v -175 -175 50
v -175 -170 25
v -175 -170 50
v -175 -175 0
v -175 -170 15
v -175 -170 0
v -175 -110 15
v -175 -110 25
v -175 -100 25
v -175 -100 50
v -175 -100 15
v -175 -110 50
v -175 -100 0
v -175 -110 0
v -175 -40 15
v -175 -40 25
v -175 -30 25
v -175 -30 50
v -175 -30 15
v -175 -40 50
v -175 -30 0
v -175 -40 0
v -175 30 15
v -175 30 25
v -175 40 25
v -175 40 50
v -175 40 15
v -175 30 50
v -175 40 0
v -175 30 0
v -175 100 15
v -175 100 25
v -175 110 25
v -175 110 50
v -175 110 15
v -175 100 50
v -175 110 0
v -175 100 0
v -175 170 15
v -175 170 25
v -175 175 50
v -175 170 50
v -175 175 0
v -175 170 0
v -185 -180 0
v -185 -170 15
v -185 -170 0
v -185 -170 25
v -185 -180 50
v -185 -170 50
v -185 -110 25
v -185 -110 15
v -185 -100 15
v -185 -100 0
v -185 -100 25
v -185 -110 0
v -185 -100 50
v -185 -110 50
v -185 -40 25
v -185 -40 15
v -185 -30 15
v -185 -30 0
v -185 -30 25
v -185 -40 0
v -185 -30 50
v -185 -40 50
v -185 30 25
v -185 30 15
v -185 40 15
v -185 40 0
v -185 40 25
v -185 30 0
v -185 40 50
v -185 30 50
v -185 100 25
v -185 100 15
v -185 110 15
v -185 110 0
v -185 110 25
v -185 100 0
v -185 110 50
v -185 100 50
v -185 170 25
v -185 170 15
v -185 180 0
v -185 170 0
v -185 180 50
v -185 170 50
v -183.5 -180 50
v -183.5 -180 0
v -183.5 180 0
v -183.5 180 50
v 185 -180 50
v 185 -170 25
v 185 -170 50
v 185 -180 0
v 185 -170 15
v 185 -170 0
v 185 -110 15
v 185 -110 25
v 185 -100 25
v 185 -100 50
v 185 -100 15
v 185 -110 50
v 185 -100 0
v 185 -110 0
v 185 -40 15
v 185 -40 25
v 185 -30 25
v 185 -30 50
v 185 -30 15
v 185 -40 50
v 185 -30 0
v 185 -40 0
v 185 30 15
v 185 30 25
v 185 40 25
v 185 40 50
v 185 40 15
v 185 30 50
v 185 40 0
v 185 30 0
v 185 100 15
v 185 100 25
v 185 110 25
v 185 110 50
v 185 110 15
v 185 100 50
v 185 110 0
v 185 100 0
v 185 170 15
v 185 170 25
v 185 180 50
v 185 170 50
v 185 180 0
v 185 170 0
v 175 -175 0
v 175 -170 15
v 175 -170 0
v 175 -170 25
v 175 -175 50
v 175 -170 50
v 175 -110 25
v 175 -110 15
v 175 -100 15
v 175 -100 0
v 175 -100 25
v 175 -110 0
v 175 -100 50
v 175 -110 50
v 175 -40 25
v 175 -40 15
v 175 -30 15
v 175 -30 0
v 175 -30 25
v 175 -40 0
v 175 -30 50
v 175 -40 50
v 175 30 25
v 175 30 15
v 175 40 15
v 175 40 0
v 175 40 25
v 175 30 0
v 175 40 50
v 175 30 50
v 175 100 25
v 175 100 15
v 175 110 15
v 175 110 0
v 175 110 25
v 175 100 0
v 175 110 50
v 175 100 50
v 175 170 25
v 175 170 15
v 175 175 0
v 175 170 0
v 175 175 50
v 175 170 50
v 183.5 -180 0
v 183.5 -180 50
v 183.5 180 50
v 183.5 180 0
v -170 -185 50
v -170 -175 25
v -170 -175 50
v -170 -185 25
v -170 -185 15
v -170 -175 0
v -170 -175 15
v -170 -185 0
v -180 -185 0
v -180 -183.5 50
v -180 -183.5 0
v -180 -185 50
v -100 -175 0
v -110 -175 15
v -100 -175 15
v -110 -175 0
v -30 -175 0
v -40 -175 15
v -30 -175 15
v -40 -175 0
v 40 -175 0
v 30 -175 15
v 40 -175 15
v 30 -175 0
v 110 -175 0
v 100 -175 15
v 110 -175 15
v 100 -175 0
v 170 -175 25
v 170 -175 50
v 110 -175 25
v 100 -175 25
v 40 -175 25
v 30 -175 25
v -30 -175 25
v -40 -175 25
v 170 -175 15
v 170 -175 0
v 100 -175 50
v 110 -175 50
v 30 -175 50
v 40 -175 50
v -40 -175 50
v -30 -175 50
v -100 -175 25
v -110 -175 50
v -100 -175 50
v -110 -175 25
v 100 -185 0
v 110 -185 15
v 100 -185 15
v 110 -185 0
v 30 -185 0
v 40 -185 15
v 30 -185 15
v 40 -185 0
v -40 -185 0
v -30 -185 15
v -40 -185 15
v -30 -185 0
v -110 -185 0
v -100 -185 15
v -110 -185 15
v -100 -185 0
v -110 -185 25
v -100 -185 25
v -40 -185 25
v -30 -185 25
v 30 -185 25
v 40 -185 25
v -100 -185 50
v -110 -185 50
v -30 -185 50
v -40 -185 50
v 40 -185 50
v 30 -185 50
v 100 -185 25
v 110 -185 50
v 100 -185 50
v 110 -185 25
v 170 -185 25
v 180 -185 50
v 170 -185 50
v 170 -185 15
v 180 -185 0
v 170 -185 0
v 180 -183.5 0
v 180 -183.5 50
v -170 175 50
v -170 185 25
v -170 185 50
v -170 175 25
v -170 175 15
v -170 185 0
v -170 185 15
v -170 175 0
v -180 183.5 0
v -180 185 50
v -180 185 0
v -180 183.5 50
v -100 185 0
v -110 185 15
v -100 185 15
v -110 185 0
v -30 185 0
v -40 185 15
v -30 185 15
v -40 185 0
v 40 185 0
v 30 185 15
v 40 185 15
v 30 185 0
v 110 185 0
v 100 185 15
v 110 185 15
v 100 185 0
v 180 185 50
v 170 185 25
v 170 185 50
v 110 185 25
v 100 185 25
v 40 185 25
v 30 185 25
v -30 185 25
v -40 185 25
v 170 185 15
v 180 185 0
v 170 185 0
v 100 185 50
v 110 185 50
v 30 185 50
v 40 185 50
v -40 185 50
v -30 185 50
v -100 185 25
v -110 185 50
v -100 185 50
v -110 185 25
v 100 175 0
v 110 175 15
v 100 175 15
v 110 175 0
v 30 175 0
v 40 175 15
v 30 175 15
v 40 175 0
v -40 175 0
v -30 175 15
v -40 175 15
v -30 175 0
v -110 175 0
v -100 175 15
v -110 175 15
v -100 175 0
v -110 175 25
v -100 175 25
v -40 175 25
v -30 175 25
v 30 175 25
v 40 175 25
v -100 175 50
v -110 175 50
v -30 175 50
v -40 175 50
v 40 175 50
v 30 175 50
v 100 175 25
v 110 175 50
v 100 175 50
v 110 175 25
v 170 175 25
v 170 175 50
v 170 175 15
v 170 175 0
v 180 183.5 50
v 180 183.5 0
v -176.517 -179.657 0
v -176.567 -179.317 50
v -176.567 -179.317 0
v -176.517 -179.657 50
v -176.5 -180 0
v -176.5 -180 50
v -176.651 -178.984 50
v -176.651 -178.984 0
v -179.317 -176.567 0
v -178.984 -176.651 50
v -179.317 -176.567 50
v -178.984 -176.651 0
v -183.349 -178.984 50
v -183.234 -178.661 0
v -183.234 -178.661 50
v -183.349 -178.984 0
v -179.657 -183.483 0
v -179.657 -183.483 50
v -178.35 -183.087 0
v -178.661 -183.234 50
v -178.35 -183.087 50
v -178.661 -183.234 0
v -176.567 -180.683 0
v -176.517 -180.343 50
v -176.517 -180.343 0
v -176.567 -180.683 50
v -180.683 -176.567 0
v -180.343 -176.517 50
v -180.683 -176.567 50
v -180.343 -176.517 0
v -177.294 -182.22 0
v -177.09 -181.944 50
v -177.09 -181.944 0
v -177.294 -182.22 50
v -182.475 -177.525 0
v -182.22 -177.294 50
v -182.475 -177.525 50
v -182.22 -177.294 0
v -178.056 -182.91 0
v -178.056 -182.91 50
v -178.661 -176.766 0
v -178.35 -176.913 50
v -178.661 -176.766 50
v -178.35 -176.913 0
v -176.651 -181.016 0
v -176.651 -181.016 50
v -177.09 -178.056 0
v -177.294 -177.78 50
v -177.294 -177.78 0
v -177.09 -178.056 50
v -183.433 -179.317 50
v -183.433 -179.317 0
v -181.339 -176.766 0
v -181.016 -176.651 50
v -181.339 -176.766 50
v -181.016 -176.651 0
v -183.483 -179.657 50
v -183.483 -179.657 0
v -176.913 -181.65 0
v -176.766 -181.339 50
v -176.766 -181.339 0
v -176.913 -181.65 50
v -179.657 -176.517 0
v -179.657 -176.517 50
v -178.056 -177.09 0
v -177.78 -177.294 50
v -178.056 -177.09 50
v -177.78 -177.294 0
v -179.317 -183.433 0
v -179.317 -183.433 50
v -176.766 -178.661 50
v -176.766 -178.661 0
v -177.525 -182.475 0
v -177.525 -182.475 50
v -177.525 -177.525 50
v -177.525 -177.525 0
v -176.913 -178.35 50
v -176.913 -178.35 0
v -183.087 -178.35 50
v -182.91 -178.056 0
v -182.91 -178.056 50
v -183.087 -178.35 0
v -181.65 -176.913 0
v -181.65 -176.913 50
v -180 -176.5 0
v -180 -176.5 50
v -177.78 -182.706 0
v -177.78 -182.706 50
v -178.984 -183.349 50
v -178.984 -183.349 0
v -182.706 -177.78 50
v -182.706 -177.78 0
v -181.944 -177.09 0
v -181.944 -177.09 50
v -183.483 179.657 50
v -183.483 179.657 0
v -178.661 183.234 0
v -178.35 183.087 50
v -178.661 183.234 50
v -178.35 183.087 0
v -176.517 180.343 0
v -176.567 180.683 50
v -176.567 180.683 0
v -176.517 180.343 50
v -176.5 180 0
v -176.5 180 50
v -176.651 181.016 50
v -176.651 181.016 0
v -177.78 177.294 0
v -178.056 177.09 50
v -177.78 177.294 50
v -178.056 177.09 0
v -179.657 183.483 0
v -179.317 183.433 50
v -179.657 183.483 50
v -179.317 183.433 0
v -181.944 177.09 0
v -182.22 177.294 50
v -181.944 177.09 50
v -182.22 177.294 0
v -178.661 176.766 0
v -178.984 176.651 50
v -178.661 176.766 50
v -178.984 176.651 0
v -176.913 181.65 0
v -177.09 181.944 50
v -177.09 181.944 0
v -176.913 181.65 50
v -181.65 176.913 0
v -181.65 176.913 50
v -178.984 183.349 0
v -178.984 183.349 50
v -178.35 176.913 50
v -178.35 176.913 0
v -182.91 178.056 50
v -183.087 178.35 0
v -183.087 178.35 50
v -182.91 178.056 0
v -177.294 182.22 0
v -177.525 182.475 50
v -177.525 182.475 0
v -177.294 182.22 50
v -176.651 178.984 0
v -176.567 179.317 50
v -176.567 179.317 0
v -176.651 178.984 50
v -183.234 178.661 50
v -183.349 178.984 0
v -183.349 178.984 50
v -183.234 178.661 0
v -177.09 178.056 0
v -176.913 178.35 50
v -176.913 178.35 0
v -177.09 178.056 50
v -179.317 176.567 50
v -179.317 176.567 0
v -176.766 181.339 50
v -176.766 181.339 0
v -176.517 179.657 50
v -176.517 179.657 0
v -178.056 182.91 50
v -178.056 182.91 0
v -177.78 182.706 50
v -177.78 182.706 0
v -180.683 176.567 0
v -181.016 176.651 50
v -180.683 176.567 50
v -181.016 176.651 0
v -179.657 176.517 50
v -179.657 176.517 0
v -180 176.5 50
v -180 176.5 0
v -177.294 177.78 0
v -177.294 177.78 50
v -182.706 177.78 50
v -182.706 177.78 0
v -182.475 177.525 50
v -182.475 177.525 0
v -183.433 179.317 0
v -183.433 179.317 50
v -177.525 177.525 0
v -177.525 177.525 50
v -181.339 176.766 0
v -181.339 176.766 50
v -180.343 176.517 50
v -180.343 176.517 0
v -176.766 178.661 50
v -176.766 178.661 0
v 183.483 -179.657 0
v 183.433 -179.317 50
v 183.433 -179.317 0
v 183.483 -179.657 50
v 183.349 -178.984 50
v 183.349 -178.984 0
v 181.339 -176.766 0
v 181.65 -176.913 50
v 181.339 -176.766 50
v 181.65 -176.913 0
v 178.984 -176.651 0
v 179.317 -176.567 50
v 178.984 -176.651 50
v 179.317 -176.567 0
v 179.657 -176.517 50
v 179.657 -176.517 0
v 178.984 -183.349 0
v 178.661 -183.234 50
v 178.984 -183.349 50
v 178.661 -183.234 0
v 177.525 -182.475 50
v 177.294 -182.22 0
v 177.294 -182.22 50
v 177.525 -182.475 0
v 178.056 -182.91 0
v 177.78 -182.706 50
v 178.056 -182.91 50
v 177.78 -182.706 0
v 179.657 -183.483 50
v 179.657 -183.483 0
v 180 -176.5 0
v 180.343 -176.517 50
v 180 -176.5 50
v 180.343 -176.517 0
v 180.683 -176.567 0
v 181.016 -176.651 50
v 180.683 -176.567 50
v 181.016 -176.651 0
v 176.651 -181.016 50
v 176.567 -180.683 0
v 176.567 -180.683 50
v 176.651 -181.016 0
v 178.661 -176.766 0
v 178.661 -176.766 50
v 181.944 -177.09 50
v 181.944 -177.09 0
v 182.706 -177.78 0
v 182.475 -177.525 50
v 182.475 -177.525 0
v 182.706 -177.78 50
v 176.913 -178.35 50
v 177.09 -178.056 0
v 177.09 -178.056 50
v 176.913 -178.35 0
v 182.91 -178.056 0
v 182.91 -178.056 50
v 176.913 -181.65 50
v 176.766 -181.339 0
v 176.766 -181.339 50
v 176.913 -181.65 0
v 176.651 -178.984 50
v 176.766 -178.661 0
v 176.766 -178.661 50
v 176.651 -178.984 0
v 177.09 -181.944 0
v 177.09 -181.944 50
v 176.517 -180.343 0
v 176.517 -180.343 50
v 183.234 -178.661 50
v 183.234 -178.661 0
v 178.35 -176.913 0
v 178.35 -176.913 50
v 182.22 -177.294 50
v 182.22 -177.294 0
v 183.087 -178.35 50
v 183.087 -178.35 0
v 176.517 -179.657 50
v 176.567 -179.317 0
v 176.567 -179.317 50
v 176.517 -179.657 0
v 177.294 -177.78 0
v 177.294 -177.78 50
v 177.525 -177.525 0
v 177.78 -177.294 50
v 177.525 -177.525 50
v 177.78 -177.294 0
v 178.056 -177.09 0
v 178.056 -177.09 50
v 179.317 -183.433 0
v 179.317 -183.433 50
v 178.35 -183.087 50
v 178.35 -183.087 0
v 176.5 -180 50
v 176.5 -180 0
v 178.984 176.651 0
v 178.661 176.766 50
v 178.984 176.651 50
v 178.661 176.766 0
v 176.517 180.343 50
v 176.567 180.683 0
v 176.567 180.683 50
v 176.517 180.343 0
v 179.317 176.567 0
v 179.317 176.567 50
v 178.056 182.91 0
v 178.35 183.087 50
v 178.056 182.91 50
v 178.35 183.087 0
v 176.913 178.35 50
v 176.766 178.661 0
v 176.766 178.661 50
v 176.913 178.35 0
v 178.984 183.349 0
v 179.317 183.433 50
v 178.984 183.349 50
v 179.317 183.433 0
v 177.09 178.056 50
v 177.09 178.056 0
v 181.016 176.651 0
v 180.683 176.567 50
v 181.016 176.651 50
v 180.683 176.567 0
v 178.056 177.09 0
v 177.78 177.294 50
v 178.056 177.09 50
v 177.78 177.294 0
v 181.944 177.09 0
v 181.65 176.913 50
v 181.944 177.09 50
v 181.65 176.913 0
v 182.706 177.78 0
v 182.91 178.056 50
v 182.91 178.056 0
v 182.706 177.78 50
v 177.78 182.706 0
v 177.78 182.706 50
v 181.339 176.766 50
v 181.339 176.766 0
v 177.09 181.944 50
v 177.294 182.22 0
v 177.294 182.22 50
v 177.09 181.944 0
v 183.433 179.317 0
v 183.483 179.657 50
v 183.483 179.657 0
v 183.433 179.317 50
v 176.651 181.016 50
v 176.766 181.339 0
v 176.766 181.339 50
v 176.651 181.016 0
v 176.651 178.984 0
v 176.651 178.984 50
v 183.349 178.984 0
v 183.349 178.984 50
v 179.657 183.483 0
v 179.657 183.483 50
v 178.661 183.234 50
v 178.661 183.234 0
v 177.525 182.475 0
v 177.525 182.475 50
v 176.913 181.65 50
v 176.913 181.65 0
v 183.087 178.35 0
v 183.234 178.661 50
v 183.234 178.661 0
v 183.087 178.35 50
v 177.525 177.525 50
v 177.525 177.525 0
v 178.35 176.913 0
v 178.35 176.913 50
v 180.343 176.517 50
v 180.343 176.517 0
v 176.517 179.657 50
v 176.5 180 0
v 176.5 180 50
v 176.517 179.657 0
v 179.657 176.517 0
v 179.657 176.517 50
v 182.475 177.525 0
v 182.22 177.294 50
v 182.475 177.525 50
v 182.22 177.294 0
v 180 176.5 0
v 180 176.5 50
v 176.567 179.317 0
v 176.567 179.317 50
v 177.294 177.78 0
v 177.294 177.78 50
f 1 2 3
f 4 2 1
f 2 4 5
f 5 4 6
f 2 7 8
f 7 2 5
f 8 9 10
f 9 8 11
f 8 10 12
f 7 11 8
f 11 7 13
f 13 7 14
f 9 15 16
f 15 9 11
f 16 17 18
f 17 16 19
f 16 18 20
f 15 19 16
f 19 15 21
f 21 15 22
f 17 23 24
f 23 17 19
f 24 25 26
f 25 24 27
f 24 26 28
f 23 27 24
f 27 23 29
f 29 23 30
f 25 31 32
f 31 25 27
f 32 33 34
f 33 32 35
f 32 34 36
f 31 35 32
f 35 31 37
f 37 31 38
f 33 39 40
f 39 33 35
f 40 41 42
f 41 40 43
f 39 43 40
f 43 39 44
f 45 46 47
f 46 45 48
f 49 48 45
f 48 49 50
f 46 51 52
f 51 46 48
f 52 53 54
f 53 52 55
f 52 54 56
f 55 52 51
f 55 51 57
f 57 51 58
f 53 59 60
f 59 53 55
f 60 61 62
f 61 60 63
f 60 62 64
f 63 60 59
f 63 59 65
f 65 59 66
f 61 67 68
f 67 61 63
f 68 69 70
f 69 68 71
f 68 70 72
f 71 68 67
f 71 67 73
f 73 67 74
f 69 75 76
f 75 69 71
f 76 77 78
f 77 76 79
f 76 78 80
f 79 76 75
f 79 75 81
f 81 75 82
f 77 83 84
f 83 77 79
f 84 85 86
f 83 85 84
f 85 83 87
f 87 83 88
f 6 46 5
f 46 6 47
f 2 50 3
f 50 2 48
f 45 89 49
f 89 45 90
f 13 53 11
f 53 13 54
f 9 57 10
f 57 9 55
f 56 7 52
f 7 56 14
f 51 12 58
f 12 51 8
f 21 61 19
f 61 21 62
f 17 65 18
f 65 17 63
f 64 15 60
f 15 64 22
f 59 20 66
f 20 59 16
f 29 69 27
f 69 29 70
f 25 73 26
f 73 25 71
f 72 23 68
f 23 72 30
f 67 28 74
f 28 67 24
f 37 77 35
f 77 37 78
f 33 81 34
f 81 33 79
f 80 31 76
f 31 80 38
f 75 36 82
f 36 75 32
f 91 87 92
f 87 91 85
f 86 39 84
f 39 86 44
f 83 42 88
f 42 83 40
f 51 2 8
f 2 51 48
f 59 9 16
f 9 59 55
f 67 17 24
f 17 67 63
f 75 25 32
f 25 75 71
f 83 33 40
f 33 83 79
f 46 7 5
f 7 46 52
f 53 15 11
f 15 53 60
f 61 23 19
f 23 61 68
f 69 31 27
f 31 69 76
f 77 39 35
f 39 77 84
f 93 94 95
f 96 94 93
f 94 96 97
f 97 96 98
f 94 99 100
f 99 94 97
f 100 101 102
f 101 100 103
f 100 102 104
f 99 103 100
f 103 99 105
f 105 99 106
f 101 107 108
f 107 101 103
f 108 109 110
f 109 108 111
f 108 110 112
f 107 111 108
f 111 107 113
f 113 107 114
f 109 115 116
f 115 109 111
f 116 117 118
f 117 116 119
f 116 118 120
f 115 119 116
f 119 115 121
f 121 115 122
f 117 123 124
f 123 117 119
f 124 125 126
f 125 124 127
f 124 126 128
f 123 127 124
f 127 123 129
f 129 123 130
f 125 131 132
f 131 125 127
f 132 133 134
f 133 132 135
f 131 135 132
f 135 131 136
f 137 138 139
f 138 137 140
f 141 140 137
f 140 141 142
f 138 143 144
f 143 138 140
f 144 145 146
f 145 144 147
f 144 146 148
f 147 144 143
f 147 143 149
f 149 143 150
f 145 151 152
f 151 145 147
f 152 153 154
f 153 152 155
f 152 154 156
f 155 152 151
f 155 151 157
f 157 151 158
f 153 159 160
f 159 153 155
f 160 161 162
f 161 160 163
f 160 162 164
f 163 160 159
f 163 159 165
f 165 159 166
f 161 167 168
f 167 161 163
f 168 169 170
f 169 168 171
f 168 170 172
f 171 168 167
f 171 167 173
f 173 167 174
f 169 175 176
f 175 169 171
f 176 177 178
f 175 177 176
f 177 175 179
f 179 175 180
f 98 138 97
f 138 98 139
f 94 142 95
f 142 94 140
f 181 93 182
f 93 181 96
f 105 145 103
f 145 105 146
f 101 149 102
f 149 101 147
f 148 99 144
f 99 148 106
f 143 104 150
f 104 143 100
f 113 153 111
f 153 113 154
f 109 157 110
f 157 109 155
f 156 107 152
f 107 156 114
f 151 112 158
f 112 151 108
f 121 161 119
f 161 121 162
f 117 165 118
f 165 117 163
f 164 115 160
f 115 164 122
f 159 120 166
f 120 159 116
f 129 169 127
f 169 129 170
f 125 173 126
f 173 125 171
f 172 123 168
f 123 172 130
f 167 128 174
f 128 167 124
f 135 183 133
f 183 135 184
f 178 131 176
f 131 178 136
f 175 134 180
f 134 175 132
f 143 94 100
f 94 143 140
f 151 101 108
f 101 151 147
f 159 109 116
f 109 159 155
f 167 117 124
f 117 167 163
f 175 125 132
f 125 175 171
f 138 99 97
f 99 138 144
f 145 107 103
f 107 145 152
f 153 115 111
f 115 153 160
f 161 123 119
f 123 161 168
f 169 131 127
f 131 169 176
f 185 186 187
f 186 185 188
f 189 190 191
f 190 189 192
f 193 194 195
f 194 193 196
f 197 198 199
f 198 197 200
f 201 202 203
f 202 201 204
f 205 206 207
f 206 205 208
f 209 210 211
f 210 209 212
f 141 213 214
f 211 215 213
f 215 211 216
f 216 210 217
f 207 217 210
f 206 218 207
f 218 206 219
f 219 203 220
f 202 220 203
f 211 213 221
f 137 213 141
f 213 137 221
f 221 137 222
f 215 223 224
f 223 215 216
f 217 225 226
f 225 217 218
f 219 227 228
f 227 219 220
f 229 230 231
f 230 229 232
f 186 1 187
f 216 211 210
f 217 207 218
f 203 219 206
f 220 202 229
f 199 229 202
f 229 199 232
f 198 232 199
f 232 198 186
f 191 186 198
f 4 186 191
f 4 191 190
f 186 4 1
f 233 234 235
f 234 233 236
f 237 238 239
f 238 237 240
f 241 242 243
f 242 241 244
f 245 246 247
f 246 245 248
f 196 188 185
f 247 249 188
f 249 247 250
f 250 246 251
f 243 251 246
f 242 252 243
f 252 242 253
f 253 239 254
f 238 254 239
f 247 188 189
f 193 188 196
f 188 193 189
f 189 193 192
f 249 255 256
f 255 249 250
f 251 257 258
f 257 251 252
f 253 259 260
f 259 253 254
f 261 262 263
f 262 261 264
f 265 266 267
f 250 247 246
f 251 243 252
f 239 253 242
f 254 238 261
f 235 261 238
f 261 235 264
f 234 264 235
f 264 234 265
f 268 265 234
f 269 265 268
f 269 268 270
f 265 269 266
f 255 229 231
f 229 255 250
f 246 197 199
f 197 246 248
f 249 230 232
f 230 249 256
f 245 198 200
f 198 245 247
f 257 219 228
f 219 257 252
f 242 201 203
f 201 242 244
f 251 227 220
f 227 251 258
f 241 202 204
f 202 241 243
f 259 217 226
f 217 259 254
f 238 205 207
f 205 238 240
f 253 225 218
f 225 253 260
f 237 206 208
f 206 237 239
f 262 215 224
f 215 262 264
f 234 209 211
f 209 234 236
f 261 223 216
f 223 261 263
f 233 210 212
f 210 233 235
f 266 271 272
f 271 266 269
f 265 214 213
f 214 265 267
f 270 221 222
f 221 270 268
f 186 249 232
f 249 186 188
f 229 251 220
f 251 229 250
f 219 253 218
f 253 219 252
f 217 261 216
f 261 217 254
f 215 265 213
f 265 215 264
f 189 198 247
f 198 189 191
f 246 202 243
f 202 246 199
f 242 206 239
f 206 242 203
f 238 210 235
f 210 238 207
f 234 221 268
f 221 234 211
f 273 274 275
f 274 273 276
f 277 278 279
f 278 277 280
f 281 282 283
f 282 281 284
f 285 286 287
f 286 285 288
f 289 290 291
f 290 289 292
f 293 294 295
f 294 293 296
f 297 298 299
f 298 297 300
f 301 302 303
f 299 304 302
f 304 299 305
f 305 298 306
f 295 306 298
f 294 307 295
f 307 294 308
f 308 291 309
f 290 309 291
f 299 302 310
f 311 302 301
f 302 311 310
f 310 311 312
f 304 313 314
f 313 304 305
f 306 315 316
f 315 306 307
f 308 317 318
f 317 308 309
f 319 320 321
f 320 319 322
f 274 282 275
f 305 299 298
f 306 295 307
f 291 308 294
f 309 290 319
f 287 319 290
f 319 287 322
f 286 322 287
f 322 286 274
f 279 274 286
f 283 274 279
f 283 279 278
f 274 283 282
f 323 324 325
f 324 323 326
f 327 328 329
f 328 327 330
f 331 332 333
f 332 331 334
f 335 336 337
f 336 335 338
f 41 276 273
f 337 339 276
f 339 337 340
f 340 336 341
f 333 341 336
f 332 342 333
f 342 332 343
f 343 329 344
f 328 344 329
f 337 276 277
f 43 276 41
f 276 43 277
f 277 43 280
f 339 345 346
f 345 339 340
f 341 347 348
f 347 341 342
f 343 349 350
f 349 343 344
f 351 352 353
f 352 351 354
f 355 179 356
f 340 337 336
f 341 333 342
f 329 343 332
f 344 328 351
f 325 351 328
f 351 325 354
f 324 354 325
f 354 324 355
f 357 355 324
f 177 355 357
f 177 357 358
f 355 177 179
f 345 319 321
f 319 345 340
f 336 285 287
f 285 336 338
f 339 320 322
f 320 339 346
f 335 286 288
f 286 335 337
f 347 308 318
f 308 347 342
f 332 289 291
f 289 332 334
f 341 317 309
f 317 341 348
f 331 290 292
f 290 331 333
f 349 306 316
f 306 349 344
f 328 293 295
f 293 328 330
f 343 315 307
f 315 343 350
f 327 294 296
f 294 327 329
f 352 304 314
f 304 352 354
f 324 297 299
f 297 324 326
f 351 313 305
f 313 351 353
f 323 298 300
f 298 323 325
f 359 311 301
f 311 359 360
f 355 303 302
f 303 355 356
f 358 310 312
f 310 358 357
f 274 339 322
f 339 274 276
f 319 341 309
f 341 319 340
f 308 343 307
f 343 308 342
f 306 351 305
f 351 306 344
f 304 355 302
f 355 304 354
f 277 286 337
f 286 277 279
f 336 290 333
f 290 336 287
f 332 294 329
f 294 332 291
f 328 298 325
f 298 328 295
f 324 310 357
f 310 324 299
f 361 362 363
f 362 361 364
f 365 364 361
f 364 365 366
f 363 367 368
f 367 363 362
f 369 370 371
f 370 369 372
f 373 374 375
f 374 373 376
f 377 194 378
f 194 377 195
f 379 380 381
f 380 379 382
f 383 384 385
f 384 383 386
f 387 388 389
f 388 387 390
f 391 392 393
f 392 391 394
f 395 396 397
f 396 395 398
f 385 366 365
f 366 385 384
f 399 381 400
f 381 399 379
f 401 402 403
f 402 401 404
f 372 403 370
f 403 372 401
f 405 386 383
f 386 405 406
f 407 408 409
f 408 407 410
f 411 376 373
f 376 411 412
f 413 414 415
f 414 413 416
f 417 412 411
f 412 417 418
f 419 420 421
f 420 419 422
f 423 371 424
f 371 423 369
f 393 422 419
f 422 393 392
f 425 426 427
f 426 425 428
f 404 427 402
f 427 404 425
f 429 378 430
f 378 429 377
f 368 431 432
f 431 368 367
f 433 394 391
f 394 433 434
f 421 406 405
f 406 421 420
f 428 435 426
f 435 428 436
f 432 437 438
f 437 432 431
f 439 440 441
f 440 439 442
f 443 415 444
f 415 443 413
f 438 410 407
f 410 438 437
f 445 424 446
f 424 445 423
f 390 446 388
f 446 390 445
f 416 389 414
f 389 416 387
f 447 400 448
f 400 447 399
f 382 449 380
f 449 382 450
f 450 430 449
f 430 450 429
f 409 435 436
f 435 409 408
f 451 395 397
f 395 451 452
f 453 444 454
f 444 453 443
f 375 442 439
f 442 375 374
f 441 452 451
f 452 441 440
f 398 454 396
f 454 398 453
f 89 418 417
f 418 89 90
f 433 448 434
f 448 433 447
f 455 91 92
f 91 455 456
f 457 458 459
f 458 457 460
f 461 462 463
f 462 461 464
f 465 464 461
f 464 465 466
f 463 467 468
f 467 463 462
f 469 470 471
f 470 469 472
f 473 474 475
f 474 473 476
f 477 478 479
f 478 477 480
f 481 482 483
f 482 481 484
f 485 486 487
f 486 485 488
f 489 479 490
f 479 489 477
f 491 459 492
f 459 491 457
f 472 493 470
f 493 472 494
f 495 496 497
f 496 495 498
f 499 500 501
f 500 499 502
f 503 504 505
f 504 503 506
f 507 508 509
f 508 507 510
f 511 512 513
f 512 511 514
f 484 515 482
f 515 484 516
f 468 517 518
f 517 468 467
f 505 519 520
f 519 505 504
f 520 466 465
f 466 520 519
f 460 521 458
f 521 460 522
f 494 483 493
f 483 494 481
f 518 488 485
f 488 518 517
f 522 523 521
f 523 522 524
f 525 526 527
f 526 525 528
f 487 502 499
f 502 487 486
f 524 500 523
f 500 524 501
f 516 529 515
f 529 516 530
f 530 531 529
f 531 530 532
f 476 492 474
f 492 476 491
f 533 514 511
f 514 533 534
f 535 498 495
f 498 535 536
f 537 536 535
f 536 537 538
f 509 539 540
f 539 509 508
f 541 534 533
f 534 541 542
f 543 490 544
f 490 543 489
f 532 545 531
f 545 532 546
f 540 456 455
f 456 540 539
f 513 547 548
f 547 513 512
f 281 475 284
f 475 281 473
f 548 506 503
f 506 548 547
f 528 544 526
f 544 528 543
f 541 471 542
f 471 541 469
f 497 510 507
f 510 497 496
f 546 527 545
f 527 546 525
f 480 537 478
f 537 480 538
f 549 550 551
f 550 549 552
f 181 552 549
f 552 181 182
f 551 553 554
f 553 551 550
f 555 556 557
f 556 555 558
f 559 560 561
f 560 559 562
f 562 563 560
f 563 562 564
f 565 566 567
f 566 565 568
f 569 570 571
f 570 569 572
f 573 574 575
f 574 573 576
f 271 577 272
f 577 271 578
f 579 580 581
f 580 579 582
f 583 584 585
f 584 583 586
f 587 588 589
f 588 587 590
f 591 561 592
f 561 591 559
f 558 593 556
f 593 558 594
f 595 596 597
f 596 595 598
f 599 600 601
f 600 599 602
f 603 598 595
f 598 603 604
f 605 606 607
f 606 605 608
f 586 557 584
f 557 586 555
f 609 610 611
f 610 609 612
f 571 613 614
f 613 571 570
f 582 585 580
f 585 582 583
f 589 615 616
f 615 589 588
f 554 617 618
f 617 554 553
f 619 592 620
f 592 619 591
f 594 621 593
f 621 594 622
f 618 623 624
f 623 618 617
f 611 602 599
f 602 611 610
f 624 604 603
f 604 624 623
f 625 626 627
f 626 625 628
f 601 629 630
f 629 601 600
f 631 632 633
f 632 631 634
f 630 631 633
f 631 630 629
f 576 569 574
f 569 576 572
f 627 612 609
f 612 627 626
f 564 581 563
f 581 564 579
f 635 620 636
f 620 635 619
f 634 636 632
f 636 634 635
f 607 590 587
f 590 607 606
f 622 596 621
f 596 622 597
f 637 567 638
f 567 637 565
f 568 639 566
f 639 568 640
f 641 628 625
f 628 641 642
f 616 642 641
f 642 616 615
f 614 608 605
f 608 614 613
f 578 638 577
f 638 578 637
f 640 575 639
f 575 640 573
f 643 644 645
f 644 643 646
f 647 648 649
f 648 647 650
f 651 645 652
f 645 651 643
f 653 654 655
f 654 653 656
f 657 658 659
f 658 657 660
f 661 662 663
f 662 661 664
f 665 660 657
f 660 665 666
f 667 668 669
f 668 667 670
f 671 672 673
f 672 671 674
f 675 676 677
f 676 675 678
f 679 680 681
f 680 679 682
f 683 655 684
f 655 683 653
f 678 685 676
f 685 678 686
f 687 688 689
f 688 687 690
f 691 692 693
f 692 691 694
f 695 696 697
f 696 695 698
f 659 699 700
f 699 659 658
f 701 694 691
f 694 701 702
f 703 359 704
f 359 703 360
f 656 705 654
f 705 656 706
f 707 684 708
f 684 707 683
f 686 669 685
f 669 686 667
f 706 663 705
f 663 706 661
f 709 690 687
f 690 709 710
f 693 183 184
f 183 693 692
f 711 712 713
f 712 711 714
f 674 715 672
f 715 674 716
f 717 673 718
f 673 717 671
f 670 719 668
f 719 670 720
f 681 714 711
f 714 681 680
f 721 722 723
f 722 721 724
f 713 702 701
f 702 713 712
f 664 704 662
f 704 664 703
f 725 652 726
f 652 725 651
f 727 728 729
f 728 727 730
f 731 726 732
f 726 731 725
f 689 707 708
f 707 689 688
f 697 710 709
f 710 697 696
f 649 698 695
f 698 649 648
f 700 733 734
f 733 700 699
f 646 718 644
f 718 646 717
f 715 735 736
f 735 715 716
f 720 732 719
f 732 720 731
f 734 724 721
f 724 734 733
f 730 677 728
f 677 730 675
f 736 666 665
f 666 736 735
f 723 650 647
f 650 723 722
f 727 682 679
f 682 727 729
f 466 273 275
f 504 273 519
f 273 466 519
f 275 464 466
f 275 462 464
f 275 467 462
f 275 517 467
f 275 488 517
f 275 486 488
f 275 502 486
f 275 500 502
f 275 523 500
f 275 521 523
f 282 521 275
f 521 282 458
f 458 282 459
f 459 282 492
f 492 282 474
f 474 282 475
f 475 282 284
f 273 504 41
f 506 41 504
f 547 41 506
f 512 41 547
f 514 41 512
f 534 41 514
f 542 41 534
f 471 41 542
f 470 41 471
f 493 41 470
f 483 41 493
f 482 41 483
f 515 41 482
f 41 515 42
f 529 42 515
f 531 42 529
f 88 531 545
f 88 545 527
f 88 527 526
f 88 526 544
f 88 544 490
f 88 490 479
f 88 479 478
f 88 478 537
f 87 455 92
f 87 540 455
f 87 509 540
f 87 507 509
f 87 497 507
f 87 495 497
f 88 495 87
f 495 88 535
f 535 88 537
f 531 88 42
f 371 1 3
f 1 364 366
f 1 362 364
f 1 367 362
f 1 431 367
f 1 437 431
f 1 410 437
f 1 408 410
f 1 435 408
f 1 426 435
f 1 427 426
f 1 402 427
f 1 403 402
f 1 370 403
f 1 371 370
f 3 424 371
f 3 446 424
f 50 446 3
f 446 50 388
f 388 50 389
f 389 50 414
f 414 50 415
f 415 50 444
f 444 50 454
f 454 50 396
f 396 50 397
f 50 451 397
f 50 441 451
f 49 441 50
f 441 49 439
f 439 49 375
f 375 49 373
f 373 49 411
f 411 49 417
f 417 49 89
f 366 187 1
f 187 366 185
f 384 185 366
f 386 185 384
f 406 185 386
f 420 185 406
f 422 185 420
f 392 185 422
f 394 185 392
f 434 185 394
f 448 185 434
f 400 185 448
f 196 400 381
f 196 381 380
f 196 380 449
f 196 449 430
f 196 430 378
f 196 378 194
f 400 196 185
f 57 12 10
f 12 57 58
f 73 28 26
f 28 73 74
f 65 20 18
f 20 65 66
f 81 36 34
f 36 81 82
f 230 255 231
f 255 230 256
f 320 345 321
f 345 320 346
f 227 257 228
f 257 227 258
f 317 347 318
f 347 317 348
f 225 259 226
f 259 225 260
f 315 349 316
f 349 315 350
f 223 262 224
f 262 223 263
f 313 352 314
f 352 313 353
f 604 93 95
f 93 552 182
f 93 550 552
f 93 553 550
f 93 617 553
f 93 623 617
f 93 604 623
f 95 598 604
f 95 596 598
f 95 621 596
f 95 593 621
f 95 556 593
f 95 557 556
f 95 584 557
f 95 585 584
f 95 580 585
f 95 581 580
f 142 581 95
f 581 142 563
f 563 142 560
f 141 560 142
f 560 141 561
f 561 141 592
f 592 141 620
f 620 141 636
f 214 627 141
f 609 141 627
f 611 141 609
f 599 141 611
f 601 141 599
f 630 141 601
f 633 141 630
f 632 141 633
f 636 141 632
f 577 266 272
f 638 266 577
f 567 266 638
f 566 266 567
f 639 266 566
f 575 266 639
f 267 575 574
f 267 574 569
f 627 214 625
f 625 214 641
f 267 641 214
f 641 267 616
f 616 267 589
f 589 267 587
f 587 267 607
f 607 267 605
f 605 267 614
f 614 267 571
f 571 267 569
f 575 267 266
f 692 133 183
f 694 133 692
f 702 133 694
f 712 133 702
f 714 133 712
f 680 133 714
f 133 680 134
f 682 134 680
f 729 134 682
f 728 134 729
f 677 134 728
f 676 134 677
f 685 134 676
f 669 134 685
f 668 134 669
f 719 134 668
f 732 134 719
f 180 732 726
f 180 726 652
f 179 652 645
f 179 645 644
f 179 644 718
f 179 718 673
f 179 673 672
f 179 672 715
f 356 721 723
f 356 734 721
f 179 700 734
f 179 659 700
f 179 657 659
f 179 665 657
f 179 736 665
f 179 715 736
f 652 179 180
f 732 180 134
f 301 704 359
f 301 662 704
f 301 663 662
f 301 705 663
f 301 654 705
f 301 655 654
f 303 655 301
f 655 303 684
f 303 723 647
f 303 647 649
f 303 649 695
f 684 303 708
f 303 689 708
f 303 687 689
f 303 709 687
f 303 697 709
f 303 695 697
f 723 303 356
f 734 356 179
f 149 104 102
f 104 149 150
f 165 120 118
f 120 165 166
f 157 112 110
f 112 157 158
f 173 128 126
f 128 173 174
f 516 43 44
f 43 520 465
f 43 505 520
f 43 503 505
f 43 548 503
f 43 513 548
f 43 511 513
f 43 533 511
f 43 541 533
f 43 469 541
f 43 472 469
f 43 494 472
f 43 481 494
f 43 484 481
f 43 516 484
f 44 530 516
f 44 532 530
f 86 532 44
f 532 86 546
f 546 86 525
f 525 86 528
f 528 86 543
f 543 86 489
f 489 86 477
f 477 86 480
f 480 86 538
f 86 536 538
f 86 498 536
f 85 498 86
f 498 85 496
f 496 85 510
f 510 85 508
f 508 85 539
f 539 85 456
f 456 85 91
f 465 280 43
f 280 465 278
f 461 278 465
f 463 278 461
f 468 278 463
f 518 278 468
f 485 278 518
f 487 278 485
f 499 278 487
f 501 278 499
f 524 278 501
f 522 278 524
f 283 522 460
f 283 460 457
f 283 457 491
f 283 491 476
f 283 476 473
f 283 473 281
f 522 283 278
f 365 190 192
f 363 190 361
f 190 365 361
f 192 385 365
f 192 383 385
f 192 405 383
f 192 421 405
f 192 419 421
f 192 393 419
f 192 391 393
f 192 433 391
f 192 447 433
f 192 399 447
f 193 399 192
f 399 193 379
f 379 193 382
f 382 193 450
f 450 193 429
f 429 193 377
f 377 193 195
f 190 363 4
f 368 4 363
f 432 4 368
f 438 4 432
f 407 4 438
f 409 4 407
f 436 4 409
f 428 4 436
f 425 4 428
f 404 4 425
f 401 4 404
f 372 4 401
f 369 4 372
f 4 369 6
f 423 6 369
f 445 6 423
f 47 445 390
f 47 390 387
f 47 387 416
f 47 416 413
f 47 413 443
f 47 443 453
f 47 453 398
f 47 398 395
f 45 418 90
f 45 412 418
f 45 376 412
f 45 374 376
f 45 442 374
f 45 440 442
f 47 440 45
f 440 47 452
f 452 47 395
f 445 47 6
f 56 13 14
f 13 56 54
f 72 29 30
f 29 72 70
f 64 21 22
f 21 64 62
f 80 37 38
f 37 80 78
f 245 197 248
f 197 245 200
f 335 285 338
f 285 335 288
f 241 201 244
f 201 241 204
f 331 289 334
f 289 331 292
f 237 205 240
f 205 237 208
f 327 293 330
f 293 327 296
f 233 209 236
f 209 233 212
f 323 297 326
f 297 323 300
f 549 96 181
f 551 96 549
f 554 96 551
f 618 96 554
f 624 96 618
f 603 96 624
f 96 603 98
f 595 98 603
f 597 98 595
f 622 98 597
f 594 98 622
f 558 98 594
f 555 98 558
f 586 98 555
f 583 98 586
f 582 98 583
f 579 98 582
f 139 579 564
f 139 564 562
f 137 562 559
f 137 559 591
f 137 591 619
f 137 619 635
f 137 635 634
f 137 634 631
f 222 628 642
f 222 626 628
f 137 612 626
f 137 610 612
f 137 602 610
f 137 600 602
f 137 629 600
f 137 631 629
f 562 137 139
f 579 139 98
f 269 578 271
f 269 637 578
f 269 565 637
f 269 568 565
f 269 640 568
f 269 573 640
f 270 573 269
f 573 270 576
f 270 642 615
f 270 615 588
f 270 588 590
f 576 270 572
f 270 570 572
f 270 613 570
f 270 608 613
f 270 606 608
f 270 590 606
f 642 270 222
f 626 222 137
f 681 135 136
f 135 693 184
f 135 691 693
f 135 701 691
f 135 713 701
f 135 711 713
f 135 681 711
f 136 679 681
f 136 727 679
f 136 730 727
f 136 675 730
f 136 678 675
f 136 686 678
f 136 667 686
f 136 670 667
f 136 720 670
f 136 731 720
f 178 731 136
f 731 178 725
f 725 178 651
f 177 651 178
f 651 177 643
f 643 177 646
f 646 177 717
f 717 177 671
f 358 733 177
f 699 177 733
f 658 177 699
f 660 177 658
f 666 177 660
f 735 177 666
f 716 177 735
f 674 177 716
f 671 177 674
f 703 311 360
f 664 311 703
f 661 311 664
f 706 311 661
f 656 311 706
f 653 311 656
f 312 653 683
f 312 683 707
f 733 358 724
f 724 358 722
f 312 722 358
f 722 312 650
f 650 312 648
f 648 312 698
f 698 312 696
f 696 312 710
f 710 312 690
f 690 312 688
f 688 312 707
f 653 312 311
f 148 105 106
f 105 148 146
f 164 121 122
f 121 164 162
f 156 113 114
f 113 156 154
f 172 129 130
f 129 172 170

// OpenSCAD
/*
  Cage slice 12 of 15
*/

bar = 10;
half_inner = 175;
gap = 70;
rod_d = 7;
half_outer = half_inner + bar;

function grid_pos(n) = -half_inner + n * gap;

module cage_full() {
  difference() {
    union() {
      // Floor grid at z = -10 .. 0
      for (j = [0:5]) {
        y = grid_pos(j);
        translate([-half_inner, y - bar/2, -bar])
          cube([2*half_inner, bar, bar], center=false);
      }
      for (i = [0:5]) {
        x = grid_pos(i);
        translate([x - bar/2, -half_inner, -bar])
          cube([bar, 2*half_inner, bar], center=false);
      }

      // Roof grid at z = 700 .. 710
      for (j = [0:5]) {
        y = grid_pos(j);
        translate([-half_inner, y - bar/2, 700])
          cube([2*half_inner, bar, bar], center=false);
      }
      for (i = [0:5]) {
        x = grid_pos(i);
        translate([x - bar/2, -half_inner, 700])
          cube([bar, 2*half_inner, bar], center=false);
      }

      // Side walls at x = ±175
      for (side = [-1, 1]) {
        sx = side * half_inner;
        x0 = (side == 1) ? sx : sx - bar;
        for (j = [0:5]) {
          y = grid_pos(j);
          translate([x0, y - bar/2, 0])
            cube([bar, bar, 700], center=false);
        }
        for (k = [0:10]) {
          zc = 0 + k * gap;
          translate([x0, -half_inner, zc - bar/2])
            cube([bar, 2*half_inner, bar], center=false);
        }
      }

      // Front/back walls at y = ±175
      for (side = [-1, 1]) {
        sy = side * half_inner;
        y0 = (side == 1) ? sy : sy - bar;
        for (i = [0:5]) {
          x = grid_pos(i);
          translate([x - bar/2, y0, 0])
            cube([bar, bar, 700], center=false);
        }
        for (k = [0:10]) {
          zc = 0 + k * gap;
          translate([-half_inner, y0, zc - bar/2])
            cube([2*half_inner, bar, bar], center=false);
        }
      }
    }

    for (sx = [-1, 1], sy = [-1, 1]) {
      translate([sx * (half_inner + bar/2),
                 sy * (half_inner + bar/2),
                 -20])
        cylinder(d = rod_d, h = 740, $fn = 64);
    }
  }
}

z_min = 540;
z_max = 590;  // height 50 mm

module slice() {
  intersection() {
    cage_full();
    translate([-half_outer - 5, -half_outer - 5, z_min])
      cube([2*(half_outer + 5), 2*(half_outer + 5), z_max - z_min], center=false);
  }
}

translate([0, 0, -z_min])
  slice();
